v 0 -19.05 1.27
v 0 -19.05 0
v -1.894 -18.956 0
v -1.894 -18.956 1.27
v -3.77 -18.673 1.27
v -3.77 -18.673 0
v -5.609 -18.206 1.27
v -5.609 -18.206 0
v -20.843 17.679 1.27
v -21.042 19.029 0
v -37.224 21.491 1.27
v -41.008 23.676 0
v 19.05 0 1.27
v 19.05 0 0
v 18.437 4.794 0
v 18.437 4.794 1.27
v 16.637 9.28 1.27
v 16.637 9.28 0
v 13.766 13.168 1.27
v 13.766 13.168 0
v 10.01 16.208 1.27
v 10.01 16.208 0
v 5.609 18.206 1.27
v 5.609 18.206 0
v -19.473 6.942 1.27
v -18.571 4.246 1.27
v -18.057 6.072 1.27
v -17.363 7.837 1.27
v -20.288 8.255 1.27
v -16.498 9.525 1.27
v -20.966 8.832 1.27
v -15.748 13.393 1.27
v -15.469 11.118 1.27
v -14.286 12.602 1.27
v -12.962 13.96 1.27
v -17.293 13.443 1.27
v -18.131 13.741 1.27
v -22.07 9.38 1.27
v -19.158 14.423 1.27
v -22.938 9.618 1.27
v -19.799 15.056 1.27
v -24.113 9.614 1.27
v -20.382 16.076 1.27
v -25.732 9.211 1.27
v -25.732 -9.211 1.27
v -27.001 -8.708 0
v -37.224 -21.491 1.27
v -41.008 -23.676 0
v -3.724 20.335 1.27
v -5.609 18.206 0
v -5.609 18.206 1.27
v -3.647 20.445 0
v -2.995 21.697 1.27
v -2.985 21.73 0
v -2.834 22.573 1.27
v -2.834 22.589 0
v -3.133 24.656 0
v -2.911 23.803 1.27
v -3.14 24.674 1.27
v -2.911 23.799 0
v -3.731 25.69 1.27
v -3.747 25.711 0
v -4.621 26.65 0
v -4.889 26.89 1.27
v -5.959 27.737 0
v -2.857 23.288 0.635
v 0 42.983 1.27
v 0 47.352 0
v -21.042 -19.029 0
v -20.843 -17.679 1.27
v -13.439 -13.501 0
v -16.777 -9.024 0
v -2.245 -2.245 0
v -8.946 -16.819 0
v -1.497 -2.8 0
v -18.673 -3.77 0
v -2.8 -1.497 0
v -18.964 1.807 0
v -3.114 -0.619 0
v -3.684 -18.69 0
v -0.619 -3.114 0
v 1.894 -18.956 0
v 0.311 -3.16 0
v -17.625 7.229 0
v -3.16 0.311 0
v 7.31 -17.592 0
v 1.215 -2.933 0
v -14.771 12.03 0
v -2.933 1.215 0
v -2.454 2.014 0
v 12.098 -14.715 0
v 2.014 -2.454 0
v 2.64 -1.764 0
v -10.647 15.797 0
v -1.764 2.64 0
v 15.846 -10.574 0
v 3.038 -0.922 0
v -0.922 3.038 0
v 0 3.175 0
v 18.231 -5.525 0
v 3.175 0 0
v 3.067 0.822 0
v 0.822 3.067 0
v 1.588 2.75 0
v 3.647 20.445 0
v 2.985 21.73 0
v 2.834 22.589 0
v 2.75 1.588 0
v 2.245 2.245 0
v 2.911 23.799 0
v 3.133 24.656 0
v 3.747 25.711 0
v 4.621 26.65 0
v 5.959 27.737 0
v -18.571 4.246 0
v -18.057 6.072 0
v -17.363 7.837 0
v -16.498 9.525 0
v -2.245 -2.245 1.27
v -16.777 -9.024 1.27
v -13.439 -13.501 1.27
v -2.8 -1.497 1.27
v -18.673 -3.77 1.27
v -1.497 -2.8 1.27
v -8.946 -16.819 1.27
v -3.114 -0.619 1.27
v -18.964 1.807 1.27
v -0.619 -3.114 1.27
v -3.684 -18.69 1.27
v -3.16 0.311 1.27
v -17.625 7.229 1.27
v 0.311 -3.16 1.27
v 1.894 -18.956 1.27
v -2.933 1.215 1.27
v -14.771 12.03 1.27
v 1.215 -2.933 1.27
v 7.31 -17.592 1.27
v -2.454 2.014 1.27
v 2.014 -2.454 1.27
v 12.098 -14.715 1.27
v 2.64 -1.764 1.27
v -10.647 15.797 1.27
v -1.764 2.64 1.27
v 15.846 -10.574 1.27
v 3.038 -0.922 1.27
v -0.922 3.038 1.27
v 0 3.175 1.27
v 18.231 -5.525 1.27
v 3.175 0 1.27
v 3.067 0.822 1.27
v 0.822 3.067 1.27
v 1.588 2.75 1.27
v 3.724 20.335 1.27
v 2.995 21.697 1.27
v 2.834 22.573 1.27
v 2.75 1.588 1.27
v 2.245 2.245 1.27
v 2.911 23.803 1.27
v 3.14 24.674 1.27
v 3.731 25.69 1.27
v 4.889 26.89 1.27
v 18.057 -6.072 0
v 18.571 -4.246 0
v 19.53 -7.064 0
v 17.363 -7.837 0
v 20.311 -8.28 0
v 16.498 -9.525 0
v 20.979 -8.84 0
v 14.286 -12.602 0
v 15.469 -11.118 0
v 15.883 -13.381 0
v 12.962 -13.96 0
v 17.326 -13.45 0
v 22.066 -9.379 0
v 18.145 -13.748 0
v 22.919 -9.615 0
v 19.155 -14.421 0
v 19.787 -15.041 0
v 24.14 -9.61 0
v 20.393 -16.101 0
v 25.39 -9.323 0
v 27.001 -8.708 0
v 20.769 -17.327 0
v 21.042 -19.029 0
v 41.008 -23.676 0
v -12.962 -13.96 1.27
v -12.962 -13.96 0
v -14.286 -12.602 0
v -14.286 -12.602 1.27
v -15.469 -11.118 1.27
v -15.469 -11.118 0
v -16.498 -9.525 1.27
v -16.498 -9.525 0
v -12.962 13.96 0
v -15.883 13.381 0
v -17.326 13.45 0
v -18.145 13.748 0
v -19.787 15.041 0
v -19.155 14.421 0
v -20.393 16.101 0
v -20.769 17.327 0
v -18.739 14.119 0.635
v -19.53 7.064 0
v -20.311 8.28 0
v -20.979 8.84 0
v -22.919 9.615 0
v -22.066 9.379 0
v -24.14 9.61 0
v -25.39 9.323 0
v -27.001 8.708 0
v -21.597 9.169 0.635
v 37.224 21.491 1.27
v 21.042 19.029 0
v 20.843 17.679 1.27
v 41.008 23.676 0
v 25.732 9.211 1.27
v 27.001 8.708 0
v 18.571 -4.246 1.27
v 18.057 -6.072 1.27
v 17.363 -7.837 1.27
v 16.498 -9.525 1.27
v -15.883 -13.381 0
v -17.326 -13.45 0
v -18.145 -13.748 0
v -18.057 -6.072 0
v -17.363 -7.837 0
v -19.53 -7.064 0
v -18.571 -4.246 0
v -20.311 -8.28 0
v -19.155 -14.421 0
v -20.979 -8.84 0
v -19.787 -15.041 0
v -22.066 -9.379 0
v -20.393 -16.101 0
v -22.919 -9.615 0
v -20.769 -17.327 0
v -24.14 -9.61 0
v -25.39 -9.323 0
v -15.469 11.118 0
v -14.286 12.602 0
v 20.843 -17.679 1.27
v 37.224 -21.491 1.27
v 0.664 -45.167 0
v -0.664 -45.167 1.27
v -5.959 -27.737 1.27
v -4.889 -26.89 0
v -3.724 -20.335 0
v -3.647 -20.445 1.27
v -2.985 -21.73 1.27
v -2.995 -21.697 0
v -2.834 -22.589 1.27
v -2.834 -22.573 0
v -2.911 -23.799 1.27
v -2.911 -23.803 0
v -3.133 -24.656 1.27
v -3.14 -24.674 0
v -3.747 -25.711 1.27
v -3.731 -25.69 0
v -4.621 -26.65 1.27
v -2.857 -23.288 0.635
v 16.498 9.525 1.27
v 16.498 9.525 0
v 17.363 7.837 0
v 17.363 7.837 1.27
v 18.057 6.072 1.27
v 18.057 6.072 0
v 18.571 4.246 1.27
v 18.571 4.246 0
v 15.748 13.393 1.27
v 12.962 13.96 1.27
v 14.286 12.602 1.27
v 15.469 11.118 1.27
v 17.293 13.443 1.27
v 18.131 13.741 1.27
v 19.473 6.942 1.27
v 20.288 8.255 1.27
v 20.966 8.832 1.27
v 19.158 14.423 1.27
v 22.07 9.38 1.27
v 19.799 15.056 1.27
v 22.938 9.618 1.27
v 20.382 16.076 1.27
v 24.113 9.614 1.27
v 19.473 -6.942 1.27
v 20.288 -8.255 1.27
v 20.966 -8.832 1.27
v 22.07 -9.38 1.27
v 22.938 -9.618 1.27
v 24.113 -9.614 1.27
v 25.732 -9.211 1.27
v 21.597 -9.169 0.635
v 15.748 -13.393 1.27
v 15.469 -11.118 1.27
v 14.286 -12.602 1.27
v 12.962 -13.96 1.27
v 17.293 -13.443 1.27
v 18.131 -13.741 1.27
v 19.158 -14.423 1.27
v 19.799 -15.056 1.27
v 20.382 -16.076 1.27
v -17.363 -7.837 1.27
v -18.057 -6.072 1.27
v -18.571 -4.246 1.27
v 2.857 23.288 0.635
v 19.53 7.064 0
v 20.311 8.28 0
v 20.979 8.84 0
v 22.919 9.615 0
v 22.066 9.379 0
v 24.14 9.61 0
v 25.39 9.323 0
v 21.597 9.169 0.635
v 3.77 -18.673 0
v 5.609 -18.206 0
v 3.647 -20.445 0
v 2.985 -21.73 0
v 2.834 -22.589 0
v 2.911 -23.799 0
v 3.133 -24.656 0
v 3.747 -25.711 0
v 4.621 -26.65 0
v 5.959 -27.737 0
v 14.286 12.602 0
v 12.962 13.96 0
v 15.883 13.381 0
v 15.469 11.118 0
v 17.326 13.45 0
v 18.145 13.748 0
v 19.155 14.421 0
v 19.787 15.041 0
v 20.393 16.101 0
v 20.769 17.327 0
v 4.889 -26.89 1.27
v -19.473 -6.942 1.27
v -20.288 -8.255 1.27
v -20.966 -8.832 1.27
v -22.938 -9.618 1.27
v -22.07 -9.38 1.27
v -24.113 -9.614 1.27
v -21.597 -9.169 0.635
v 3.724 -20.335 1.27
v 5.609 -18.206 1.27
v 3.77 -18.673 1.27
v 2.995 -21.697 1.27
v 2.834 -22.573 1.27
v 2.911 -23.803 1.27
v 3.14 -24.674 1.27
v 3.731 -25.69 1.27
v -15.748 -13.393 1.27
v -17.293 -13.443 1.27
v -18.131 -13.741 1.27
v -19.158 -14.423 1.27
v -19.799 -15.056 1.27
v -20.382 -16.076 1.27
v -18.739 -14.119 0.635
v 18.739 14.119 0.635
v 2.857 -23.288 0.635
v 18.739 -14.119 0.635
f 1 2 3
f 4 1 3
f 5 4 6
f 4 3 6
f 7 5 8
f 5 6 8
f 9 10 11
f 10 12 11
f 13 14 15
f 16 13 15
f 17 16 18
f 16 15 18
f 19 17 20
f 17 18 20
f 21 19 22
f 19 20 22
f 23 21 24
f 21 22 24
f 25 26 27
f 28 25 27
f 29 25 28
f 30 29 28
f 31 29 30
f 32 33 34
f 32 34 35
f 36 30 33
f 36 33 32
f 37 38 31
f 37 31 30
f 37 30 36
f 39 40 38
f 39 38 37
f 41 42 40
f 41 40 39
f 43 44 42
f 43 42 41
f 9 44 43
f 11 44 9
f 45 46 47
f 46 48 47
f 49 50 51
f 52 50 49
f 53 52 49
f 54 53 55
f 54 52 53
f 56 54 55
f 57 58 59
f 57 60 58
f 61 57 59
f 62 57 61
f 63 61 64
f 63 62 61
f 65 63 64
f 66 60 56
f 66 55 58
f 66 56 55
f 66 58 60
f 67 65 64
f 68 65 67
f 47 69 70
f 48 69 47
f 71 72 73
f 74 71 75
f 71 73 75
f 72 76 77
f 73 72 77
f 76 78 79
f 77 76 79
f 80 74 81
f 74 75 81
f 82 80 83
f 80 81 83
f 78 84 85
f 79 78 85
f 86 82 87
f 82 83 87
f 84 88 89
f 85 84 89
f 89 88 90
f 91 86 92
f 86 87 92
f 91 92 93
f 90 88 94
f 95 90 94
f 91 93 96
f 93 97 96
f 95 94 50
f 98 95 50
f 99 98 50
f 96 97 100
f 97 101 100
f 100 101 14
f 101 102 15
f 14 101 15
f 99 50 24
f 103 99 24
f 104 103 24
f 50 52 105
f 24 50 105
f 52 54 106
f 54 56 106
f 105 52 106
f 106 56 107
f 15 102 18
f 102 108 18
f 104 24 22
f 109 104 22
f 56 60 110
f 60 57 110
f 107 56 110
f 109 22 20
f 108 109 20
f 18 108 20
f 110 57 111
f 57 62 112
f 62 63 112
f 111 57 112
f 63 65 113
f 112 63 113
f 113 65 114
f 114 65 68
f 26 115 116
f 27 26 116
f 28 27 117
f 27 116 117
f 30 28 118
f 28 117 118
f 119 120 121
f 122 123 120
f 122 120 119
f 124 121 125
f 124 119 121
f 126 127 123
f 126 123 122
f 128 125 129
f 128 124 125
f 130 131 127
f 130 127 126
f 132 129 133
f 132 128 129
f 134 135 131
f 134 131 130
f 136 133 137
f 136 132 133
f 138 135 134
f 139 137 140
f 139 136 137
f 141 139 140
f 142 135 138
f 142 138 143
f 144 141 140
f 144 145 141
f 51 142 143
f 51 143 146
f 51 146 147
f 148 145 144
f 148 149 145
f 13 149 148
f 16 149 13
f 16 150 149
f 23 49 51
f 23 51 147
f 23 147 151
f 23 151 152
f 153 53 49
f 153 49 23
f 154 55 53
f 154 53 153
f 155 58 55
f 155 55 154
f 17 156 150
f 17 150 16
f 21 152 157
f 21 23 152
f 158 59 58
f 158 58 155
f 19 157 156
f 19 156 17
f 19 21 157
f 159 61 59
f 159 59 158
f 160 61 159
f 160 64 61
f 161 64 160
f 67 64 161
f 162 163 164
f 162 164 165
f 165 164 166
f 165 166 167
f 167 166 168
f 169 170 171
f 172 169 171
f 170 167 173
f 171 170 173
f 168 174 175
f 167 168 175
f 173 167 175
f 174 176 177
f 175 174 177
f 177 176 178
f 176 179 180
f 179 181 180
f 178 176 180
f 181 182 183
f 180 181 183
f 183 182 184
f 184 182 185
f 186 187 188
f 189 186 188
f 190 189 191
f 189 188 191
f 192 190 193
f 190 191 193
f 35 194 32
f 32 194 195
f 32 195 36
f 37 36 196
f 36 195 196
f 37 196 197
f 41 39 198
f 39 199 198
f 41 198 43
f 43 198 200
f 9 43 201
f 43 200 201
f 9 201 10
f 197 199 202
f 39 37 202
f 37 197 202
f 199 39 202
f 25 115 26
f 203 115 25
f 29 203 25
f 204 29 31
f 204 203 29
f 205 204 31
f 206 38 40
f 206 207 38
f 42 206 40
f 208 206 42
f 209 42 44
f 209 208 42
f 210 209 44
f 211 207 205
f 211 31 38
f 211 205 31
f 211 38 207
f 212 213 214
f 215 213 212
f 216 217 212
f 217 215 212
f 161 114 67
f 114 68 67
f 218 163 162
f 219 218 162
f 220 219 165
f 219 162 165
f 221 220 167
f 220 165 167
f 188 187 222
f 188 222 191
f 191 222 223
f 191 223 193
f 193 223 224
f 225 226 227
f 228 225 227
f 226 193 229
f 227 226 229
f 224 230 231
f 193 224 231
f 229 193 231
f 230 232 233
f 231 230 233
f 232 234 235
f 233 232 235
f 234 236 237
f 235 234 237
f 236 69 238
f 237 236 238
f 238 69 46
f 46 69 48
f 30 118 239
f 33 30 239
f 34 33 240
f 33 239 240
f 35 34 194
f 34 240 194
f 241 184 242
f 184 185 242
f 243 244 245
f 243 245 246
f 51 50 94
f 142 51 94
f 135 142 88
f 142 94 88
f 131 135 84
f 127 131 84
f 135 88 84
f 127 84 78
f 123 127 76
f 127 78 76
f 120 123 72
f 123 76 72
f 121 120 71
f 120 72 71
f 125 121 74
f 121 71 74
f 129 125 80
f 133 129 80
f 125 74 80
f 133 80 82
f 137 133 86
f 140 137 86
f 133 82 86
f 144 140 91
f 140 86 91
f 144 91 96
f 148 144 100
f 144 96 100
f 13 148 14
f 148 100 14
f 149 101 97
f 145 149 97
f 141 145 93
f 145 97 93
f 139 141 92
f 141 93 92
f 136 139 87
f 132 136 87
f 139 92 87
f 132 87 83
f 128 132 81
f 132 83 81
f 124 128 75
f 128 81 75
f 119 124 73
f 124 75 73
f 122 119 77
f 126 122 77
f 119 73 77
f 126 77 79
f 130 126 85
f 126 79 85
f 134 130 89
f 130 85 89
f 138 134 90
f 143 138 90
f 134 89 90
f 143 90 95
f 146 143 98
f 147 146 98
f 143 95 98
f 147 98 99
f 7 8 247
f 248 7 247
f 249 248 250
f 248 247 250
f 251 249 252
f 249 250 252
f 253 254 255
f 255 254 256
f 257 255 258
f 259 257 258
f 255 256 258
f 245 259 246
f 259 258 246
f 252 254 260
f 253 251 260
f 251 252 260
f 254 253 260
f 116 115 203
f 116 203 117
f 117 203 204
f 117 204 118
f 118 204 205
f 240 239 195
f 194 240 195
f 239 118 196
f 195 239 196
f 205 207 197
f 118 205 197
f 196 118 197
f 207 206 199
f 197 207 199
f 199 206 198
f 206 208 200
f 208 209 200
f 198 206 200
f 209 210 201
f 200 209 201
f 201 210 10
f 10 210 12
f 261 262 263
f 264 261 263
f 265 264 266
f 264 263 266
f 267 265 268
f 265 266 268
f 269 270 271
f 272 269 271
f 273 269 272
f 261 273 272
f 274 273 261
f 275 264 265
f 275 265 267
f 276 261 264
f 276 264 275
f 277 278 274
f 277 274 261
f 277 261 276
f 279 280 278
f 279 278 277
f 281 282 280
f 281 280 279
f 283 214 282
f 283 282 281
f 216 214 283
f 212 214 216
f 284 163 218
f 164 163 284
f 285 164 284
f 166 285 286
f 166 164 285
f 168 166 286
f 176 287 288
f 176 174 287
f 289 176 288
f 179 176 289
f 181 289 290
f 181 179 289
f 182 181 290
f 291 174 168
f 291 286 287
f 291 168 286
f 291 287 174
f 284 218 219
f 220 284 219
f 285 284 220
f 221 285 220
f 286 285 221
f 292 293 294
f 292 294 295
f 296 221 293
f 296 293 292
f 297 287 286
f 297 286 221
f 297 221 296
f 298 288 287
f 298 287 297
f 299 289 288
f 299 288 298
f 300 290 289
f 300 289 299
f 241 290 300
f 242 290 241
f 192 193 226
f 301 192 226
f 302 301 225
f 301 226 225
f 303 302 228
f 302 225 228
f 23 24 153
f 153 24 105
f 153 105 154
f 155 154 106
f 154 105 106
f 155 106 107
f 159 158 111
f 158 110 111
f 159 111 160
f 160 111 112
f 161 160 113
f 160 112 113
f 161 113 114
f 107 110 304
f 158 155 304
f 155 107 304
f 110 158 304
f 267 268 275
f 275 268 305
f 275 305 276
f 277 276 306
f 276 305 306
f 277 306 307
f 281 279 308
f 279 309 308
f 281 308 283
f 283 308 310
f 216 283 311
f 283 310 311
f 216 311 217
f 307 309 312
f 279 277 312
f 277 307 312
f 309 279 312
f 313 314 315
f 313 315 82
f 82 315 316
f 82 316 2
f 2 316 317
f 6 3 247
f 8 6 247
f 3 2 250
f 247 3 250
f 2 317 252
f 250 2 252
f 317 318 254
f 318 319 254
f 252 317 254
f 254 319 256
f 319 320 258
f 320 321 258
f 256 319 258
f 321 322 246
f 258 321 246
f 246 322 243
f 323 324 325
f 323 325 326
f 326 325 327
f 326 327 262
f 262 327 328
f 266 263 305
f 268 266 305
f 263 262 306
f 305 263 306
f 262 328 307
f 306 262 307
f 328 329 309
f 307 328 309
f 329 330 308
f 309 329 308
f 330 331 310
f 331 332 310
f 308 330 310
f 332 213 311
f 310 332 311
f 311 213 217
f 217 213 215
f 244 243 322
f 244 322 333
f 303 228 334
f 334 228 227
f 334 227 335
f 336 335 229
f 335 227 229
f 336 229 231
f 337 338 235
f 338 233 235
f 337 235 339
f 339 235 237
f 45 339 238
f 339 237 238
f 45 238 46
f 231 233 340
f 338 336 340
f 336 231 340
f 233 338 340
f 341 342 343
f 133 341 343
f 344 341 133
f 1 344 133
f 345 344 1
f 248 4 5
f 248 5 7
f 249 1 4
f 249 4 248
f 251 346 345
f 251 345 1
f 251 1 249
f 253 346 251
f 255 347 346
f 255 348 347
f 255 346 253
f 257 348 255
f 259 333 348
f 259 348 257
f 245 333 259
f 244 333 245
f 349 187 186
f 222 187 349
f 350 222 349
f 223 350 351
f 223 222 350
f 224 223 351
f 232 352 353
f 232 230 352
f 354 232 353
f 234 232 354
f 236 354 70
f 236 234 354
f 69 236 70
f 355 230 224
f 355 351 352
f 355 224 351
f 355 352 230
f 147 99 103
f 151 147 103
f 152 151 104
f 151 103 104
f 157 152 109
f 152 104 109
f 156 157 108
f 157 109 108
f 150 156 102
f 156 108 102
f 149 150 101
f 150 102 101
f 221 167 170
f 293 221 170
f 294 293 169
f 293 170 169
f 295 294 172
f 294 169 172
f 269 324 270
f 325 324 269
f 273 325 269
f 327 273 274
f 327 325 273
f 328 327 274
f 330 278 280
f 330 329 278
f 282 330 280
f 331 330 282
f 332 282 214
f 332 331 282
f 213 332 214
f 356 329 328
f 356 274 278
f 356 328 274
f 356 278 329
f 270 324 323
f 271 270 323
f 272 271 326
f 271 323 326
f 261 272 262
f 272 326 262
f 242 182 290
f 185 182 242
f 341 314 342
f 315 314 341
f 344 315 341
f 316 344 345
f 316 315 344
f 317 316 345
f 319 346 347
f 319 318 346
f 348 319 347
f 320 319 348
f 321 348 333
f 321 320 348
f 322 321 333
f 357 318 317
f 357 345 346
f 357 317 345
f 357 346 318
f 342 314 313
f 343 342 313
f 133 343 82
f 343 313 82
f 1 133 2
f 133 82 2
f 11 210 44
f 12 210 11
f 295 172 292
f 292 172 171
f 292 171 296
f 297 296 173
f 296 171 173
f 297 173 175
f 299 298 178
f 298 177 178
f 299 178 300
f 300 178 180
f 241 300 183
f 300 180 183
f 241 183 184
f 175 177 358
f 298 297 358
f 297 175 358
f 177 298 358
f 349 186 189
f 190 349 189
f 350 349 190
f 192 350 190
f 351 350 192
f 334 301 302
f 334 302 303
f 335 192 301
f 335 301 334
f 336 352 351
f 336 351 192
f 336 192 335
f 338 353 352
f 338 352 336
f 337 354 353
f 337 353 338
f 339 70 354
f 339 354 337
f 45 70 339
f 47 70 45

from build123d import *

# Parameters (mm, degrees)
F1_DEPTH      = 1.27
F2_COUNT      = 6
F3_DEPTH      = 1.27
F4_T1_DEPTH   = 28.2648616639
F4_T3_DEPTH   = 28.2648616639
F4_2_T1_DEPTH = 28.2648616639
F4_2_T3_DEPTH = 28.2648616639
F4_3_T1_DEPTH = 28.2648616639
F4_3_T3_DEPTH = 28.2648616639
F4_4_T1_DEPTH = 28.2648616639
F4_4_T3_DEPTH = 28.2648616639
F4_5_T1_DEPTH = 28.2648616639
F4_5_T3_DEPTH = 28.2648616639
F4_6_T1_DEPTH = 28.2648616639
F4_6_T3_DEPTH = 28.2648616639


# Not quite as in the source:
# - a fillet or chamfer that OpenCascade refuses, or shapes differently, is made with other operations: its cross-section is extruded or revolved along the edge and cut away or added


with BuildPart() as f1:
    # F0 (on Top) → F1 (new body)
    with BuildSketch(Plane.XY):
        Polygon((0, 27.8319306672), (6.0893329792, 27.8319306672), (0, 47.8763319552), align=None)
        Polygon((0, 47.8763319552), (-6.0893329792, 27.8319306672), (0, 27.8319306672), align=None)
        with BuildLine():
            add(Edge.make_bspline(
                [(-5.6085209245, 18.2056857338), (-2.7667914864, 20.9939918215), (-2.759898495, 23.1821026248), (-3.1363011766, 25.7094376402), (-6.0893329792, 27.8319306672)],
                knots=[0, 0, 0, 0, 0.5044710626, 1, 1, 1, 1], degree=3))
            ThreePointArc((-5.6085209245, 18.2056857338), (-2.8358584917, 18.8377388934), (0, 19.05))
            Line((0, 19.05), (0, 27.8319306672))
            Line((0, 27.8319306672), (-6.0893329792, 27.8319306672))
        make_face()
        with BuildLine():
            ThreePointArc((0, 19.05), (2.8358584917, 18.8377388934), (5.6085209245, 18.2056857338))
            add(Edge.make_bspline(
                [(5.6085209245, 18.2056857338), (2.7667914864, 20.9939918215), (2.759898495, 23.1821026248), (3.1363011766, 25.7094376402), (6.0893329792, 27.8319306672)],
                knots=[0, 0, 0, 0, 0.5044710626, 1, 1, 1, 1], degree=3))
            Line((6.0893329792, 27.8319306672), (0, 27.8319306672))
            Line((0, 27.8319306672), (0, 19.05))
        make_face()
    extrude(amount=F1_DEPTH)


with BuildPart() as f2_1:
    # F2: instance of F1
    add(f1.part.rotate(Axis((0, 0, 0), (0, 0, 1)), 1 * 360 / F2_COUNT))

    # F4#2: chamfer of 1.4224 on 2 edges, made by hand

    # F4_2_s2 → F4_2_t1 (cut)
    with BuildSketch(Plane(origin=(-20.6503164596, 4.8060973638, 0), x_dir=(0, 0, 1), z_dir=(-0.9739695304, 0.2266789665, 0))):
        Polygon((-0.1524, 13.9164538313), (1.27, 12.4940538313), (1.27, 13.9164538313), align=None)
    extrude(amount=F4_2_T1_DEPTH, mode=Mode.SUBTRACT)

    # F4_2_s4 → F4_2_t3 (cut)
    with BuildSketch(Plane(origin=(-33.8005854034, 36.1180372572, 0), x_dir=(0, 0, 1), z_dir=(0.6832945087, -0.7301428726, 0))):
        Polygon((-0.1524, 13.9164538313), (1.27, 12.4940538313), (1.27, 13.9164538313), align=None)
    extrude(amount=F4_2_T3_DEPTH, mode=Mode.SUBTRACT)


with BuildPart() as f2_2:
    # F2: instance of F1
    add(f1.part.rotate(Axis((0, 0, 0), (0, 0, 1)), 2 * 360 / F2_COUNT))

    # F4#3: chamfer of 1.4224 on 2 edges, made by hand

    # F4_3_s2 → F4_3_t1 (cut)
    with BuildSketch(Plane(origin=(-48.1794305013, -11.2131469935, 0), x_dir=(0, 0, 1), z_dir=(0.9739695304, 0.2266789665, 0))):
        Polygon((-0.1524, 13.9164538313), (1.27, 12.4940538313), (1.27, 13.9164538313), align=None)
    extrude(amount=F4_3_T1_DEPTH, mode=Mode.SUBTRACT)

    # F4_3_s4 → F4_3_t3 (cut)
    with BuildSketch(Plane(origin=(-14.4873606399, -15.4806499682, 0), x_dir=(0, 0, 1), z_dir=(-0.6832945087, -0.7301428726, 0))):
        Polygon((-0.1524, 13.9164538313), (1.27, 12.4940538313), (1.27, 13.9164538313), align=None)
    extrude(amount=F4_3_T3_DEPTH, mode=Mode.SUBTRACT)


with BuildPart() as f2_3:
    # F2: instance of F1
    add(f1.part.rotate(Axis((0, 0, 0), (0, 0, 1)), 3 * 360 / F2_COUNT))

    # F4#4: chamfer of 1.4224 on 2 edges, made by hand

    # F4_4_s2 → F4_4_t1 (cut)
    with BuildSketch(Plane(origin=(-14.3788450979, -47.3311842507, 0), x_dir=(0, 0, 1), z_dir=(0.2906750217, 0.9568218391, 0))):
        Polygon((-0.1524, 13.9164538313), (1.27, 12.4940538313), (1.27, 13.9164538313), align=None)
    extrude(amount=F4_4_T1_DEPTH, mode=Mode.SUBTRACT)

    # F4_4_s4 → F4_4_t3 (cut)
    with BuildSketch(Plane(origin=(6.1629558196, -20.2867473321, 0), x_dir=(0, 0, 1), z_dir=(0.2906750217, -0.9568218391, 0))):
        Polygon((1.4224, 13.9164538313), (0, 12.4940538313), (0, 13.9164538313), align=None)
    extrude(amount=F4_4_T3_DEPTH, mode=Mode.SUBTRACT)


with BuildPart() as f2_4:
    # F2: instance of F1
    add(f1.part.rotate(Axis((0, 0, 0), (0, 0, 1)), 4 * 360 / F2_COUNT))

    # F4#5: chamfer of 1.4224 on 2 edges, made by hand

    # F4_5_s2 → F4_5_t1 (cut)
    with BuildSketch(Plane(origin=(33.8005854034, -36.1180372572, 0), x_dir=(0, 0, 1), z_dir=(-0.6832945087, 0.7301428726, 0))):
        Polygon((-0.1524, 13.9164538313), (1.27, 12.4940538313), (1.27, 13.9164538313), align=None)
    extrude(amount=F4_5_T1_DEPTH, mode=Mode.SUBTRACT)

    # F4_5_s4 → F4_5_t3 (cut)
    with BuildSketch(Plane(origin=(20.6503164596, -4.8060973638, 0), x_dir=(0, 0, 1), z_dir=(0.9739695304, -0.2266789665, 0))):
        Polygon((-0.1524, 13.9164538313), (1.27, 12.4940538313), (1.27, 13.9164538313), align=None)
    extrude(amount=F4_5_T3_DEPTH, mode=Mode.SUBTRACT)


with BuildPart() as f2_5:
    # F2: instance of F1
    add(f1.part.rotate(Axis((0, 0, 0), (0, 0, 1)), 5 * 360 / F2_COUNT))

    # F4#6: chamfer of 1.4224 on 2 edges, made by hand

    # F4_6_s2 → F4_6_t1 (cut)
    with BuildSketch(Plane(origin=(48.1794305013, 11.2131469935, 0), x_dir=(0, 0, 1), z_dir=(-0.9739695304, -0.2266789665, 0))):
        Polygon((-0.1524, 13.9164538313), (1.27, 12.4940538313), (1.27, 13.9164538313), align=None)
    extrude(amount=F4_6_T1_DEPTH, mode=Mode.SUBTRACT)

    # F4_6_s4 → F4_6_t3 (cut)
    with BuildSketch(Plane(origin=(14.4873606399, 15.4806499682, 0), x_dir=(0, 0, 1), z_dir=(0.6832945087, 0.7301428726, 0))):
        Polygon((-0.1524, 13.9164538313), (1.27, 12.4940538313), (1.27, 13.9164538313), align=None)
    extrude(amount=F4_6_T3_DEPTH, mode=Mode.SUBTRACT)


with BuildPart() as f1_1:
    add(f1.part)

    # F0 (on Top) → F3 (join)
    with BuildSketch(Plane.XY):
        with BuildLine():
            ThreePointArc((-5.6085209245, 18.2056857338), (-11.3150381437, -15.3255476837), (19.05, 0))
            ThreePointArc((19.05, 0), (15.3255476837, 11.3150381437), (5.6085209245, 18.2056857338))
            ThreePointArc((5.6085209245, 18.2056857338), (2.8358584917, 18.8377388934), (0, 19.05))
            ThreePointArc((0, 19.05), (-2.8358584917, 18.8377388934), (-5.6085209245, 18.2056857338))
        make_face()
        with BuildLine():
            ThreePointArc((3.175, 0), (-2.2450640303, -2.2450640303), (0, 3.175))
            ThreePointArc((0, 3.175), (2.2450640303, 2.2450640303), (3.175, 0))
        make_face(mode=Mode.SUBTRACT)
    extrude(amount=F3_DEPTH)

    # F4: chamfer of 1.4224 on 2 edges, made by hand

    # F4_s2 → F4_t1 (cut)
    with BuildSketch(Plane(origin=(14.3788450979, 47.3311842507, 0), x_dir=(0, 0, 1), z_dir=(-0.2906750217, -0.9568218391, 0))):
        Polygon((-0.1524, 13.9164538313), (1.27, 12.4940538313), (1.27, 13.9164538313), align=None)
    extrude(amount=F4_T1_DEPTH, mode=Mode.SUBTRACT)

    # F4_s4 → F4_t3 (cut)
    with BuildSketch(Plane(origin=(-6.1629558196, 20.2867473321, 0), x_dir=(0, 0, 1), z_dir=(-0.2906750217, 0.9568218391, 0))):
        Polygon((-0.1524, 13.9164538313), (1.27, 12.4940538313), (1.27, 13.9164538313), align=None)
    extrude(amount=F4_T3_DEPTH, mode=Mode.SUBTRACT)


solid = Compound([f2_1.part, f2_2.part, f2_3.part, f2_4.part, f2_5.part, f1_1.part])
